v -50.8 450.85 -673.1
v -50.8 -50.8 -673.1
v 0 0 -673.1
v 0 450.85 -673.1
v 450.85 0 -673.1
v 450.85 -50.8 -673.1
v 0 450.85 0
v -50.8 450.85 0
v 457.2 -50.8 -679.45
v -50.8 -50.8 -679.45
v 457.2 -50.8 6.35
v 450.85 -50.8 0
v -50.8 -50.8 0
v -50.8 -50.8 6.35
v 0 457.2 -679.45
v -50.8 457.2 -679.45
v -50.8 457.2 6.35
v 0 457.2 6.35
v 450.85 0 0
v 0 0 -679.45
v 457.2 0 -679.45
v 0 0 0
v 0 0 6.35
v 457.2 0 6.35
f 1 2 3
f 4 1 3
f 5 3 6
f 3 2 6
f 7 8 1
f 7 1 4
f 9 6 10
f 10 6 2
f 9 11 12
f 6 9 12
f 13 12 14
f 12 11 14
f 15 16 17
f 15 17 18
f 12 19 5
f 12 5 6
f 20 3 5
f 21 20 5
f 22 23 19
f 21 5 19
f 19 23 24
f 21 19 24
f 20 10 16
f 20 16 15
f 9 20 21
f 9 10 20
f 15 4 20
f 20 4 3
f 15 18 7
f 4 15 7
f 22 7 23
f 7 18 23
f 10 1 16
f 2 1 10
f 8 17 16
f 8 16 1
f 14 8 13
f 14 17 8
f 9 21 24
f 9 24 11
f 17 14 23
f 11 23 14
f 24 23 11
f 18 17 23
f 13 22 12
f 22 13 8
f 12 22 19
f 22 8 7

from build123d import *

# Parameters (mm, degrees)
F1_DEPTH = 6.35
F2_W     = 6.35
F2_H     = 50.8
F3_DEPTH = 673.1
F5_DEPTH = 6.35
F6_W     = 50.8
F6_H     = 6.35
F7_DEPTH = 673.1


with BuildPart() as f1:
    # F0 (on Top) → F1 (new body)
    with BuildSketch(Plane.XY):
        Polygon((457.2, 0), (0, 0), (0, 457.2), (-50.8, 457.2), (-50.8, -50.8), (457.2, -50.8), align=None)
    extrude(amount=F1_DEPTH)

    # F2 (on face) → F3 (join)
    with BuildSketch(Plane(origin=(0, 0, 0), x_dir=(1, 0, 0), z_dir=(0, 0, -1))):
        with Locations((454.025, 25.4)):
            Rectangle(F2_W, F2_H)
    extrude(amount=F3_DEPTH)

    # F4 (on face) → F5 (join)
    with BuildSketch(Plane(origin=(0, 0, -673.1), x_dir=(1, 0, 0), z_dir=(0, 0, -1))):
        Polygon((457.2, 0), (457.2, 50.8), (-50.8, 50.8), (-50.8, -457.2), (0, -457.2), (0, 0), align=None)
    extrude(amount=F5_DEPTH)

    # F6 (on face) → F7 (join, through all)
    with BuildSketch(Plane(origin=(0, 0, 0), x_dir=(1, 0, 0), z_dir=(0, 0, -1))):
        with Locations((-25.4, -454.025)):
            Rectangle(F6_W, F6_H)
    extrude(amount=F7_DEPTH)


solid = f1.part
